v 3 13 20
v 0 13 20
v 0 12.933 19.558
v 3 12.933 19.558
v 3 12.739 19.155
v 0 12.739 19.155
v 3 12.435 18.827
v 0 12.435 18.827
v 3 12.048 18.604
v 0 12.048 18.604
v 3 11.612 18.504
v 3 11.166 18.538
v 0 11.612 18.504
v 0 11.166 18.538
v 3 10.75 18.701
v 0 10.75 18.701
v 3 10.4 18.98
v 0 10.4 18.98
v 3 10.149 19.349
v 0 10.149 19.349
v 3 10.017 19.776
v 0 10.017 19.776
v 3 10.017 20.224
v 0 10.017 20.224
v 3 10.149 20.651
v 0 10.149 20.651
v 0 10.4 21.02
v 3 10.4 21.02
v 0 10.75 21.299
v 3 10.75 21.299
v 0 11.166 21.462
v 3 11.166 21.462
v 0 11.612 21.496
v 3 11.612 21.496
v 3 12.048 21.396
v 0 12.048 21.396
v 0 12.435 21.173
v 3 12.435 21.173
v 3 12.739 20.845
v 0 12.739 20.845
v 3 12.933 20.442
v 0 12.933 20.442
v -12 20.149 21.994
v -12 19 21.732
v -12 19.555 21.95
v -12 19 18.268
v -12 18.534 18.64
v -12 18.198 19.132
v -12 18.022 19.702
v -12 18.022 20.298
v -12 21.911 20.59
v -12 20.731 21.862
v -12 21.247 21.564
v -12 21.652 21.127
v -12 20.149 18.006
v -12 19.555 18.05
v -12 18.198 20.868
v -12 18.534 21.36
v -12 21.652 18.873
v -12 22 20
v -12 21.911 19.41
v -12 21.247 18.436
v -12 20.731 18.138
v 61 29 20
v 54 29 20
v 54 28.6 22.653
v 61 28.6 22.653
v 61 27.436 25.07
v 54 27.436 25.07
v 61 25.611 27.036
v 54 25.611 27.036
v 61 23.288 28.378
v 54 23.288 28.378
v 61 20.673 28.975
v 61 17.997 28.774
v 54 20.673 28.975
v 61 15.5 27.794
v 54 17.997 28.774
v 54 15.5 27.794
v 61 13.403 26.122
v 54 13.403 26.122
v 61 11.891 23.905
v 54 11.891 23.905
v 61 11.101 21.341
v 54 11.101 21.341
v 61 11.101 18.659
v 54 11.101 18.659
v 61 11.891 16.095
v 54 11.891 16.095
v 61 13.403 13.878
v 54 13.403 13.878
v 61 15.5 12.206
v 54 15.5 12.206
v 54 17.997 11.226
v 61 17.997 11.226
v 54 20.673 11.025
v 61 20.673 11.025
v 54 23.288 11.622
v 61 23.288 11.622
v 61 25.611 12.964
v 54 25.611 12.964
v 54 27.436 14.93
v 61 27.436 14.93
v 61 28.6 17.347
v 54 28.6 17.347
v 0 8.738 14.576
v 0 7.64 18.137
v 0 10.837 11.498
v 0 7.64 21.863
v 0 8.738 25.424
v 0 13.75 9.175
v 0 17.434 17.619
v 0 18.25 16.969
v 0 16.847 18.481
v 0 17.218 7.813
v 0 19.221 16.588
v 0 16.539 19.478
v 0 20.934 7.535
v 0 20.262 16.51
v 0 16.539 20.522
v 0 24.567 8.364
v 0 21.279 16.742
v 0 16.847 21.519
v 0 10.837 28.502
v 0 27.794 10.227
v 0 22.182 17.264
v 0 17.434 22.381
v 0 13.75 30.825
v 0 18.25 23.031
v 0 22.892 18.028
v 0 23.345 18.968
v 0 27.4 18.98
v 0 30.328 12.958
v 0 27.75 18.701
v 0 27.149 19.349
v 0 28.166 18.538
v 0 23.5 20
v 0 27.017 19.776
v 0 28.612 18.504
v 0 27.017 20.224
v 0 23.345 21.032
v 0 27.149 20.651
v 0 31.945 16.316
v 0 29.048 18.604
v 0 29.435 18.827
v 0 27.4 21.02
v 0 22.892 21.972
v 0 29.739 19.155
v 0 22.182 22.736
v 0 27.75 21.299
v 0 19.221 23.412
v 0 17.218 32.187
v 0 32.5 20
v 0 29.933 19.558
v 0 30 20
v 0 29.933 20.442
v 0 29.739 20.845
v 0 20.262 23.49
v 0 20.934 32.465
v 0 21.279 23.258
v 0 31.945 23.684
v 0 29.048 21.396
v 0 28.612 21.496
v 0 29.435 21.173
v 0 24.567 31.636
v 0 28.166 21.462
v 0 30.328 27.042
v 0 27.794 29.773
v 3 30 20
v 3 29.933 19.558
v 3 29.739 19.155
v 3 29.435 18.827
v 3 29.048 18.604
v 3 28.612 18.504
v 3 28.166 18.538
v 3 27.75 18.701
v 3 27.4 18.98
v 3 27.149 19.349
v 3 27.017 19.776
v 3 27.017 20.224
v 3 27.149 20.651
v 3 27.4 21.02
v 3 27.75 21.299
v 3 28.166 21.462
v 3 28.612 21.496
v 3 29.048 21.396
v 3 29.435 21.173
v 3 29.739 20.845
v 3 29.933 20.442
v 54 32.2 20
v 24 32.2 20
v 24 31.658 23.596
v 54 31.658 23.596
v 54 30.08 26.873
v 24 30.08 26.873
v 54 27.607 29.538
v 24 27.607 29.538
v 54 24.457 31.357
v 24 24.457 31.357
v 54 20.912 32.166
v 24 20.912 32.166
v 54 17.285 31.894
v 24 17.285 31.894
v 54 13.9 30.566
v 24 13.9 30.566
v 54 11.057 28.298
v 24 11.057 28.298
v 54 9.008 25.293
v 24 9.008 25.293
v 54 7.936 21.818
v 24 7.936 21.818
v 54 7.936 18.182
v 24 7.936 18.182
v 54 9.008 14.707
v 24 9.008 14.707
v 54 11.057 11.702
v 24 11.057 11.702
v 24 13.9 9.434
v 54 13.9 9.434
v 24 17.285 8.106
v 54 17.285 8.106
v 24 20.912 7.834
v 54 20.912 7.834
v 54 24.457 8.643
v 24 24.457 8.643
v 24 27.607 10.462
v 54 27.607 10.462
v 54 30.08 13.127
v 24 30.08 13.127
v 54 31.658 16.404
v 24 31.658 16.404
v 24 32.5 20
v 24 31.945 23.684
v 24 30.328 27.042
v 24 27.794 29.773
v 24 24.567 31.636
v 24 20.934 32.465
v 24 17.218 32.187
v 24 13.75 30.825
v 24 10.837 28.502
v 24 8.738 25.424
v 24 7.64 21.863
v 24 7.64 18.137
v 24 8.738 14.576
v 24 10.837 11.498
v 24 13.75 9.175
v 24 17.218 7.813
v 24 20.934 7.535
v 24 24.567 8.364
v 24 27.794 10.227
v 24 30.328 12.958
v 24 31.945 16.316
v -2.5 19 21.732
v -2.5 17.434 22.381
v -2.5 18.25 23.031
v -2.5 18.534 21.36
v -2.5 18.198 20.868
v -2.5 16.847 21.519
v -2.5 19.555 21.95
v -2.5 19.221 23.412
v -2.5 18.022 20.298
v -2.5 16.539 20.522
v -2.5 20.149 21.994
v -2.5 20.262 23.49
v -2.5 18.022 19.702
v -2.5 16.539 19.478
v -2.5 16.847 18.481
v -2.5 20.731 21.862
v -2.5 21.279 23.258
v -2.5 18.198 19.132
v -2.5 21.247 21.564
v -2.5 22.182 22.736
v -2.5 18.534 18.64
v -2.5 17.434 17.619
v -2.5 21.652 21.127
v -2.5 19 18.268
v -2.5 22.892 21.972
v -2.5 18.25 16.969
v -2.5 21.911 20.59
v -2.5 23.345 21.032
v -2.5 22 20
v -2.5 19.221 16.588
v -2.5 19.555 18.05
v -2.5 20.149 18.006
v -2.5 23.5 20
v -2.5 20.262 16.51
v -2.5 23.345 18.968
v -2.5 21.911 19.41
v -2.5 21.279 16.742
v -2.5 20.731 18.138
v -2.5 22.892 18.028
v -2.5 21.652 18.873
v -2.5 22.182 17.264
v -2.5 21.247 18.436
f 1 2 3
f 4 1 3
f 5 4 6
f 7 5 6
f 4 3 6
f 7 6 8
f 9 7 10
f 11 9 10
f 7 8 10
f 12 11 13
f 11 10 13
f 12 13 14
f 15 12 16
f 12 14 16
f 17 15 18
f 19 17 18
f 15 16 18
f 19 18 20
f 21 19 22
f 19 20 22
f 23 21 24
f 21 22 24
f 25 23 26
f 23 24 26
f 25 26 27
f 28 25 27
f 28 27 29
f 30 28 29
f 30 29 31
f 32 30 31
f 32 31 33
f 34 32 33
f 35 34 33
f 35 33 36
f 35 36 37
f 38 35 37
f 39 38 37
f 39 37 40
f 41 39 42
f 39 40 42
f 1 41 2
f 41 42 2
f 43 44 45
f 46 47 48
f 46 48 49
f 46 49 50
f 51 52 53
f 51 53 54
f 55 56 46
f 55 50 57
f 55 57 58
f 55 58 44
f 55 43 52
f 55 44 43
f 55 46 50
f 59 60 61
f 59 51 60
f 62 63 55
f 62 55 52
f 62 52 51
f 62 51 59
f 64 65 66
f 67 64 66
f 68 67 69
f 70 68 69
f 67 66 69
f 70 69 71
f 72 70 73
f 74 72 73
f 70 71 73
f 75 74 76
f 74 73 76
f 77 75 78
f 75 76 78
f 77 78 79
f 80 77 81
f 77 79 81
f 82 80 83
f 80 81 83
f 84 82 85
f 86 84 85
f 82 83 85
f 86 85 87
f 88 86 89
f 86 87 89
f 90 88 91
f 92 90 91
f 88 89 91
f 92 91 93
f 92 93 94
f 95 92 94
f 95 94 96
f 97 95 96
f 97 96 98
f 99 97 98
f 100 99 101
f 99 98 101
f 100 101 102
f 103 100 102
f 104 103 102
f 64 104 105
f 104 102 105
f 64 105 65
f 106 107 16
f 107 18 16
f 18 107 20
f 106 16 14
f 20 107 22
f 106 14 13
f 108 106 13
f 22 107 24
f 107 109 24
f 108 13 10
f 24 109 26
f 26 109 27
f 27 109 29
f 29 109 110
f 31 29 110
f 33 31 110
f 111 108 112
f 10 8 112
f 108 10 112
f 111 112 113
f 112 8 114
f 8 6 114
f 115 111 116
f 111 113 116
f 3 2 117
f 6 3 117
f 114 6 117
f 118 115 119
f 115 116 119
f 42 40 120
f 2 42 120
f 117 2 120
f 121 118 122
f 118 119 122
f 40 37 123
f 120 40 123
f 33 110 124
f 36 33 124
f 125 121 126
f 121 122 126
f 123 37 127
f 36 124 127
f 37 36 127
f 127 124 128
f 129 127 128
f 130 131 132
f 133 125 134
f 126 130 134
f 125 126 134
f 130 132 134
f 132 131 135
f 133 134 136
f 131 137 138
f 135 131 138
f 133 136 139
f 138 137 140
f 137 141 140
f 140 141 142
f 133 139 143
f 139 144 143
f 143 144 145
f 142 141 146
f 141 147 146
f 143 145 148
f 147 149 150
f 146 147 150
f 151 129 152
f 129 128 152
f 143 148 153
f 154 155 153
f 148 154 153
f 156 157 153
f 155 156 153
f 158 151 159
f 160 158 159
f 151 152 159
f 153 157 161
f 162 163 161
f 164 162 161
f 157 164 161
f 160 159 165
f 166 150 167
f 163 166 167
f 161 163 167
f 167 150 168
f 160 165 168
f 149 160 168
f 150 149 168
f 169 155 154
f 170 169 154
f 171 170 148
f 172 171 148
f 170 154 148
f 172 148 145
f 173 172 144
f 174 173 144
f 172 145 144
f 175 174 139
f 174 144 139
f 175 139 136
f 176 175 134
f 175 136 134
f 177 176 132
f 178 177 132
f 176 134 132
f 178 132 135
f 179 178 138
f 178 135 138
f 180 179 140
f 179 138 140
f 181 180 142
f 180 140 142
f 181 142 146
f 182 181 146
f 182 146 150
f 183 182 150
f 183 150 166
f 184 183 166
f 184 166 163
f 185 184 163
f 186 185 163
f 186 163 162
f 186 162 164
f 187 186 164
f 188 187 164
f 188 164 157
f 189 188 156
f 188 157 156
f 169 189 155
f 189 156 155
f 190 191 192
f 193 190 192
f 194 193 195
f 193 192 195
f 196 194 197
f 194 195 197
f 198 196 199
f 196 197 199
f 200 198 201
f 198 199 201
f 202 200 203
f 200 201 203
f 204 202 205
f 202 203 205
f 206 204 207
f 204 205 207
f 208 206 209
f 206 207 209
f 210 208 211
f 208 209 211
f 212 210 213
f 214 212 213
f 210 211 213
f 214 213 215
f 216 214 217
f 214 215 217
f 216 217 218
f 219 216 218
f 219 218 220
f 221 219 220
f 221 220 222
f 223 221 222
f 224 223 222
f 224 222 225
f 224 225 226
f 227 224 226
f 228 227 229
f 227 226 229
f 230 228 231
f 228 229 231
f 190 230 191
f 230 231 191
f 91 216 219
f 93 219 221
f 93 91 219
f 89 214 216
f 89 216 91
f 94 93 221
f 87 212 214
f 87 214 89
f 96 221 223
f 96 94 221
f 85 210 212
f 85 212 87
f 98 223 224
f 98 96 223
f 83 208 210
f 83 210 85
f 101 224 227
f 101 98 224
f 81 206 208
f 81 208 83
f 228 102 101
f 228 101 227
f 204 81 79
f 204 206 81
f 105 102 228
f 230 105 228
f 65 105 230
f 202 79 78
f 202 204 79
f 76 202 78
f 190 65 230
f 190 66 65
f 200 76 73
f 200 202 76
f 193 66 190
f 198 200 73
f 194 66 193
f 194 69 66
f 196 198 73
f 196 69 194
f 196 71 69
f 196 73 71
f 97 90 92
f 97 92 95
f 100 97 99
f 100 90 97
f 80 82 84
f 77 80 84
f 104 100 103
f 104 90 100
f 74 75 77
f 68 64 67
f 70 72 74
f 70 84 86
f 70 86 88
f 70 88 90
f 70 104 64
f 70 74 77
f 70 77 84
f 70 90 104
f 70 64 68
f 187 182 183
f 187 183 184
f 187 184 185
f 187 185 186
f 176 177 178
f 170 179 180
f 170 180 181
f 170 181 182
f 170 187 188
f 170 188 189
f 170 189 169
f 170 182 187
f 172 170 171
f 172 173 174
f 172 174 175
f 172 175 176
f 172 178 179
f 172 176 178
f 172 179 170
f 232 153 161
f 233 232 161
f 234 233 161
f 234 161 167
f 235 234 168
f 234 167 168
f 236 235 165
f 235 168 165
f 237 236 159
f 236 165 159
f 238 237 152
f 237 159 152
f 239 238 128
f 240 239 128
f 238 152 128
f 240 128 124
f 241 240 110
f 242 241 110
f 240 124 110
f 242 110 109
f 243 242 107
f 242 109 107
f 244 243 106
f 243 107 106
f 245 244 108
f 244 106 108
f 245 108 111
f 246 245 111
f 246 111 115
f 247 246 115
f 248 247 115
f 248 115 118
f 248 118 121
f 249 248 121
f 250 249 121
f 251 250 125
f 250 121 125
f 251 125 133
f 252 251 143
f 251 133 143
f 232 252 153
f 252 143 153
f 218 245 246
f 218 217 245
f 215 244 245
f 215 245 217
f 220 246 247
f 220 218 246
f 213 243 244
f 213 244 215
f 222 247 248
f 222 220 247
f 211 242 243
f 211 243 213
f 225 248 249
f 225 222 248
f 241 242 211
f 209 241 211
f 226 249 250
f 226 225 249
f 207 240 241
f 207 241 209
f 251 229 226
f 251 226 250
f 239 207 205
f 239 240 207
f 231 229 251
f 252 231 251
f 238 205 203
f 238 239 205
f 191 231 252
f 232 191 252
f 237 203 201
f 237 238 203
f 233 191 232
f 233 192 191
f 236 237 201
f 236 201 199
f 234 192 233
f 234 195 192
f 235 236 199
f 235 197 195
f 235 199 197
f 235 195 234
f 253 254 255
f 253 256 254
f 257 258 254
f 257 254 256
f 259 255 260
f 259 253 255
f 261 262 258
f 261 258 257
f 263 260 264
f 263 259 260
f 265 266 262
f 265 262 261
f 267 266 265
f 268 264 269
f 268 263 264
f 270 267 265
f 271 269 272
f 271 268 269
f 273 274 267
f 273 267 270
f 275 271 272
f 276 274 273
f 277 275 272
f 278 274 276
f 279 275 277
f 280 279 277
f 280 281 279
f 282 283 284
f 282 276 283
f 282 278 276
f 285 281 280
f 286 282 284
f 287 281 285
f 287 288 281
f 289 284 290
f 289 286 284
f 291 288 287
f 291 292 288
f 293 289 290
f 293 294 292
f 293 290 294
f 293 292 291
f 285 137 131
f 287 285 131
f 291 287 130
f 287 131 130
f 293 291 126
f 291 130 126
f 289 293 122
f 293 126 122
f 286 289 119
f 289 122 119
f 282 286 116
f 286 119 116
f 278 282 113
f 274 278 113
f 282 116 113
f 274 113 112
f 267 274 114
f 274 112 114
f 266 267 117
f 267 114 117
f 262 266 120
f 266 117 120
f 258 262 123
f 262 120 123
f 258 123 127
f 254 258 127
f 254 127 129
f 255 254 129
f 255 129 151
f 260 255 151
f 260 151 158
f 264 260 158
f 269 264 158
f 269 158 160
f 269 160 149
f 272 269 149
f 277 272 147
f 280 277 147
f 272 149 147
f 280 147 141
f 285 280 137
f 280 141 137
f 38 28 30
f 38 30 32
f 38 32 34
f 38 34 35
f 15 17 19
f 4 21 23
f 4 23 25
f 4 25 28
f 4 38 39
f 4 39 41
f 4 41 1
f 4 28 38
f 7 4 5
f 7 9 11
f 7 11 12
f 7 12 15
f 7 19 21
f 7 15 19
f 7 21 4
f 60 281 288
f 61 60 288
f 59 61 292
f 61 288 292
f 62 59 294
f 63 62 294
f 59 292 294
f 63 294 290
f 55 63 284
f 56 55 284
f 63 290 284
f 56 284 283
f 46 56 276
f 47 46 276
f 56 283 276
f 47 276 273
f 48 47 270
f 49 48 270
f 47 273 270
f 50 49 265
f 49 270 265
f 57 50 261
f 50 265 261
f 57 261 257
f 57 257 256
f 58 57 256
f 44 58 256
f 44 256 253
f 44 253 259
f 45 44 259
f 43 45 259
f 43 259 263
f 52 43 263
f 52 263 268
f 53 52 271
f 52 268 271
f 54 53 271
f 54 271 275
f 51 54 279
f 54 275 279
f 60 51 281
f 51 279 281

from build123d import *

# Parameters (mm, degrees)
SKETCH_R        = 12.5
PAD_DEPTH       = 24
SKETCH001_R     = 12.2
PAD001_DEPTH    = 30
SKETCH002_R     = 3.5
PAD002_DEPTH    = 2.5
SKETCH003_R     = 2
PAD003_DEPTH    = 9.5
SKETCH004_R     = 9
PAD004_DEPTH    = 7
SKETCH009_R     = 1.5
POCKET002_DEPTH = 3


with BuildPart() as part:
    # Sketch → Pad (new body)
    with BuildSketch(Plane.YZ):
        with Locations((20, 20)):
            Circle(SKETCH_R)
    extrude(amount=PAD_DEPTH)

    # Sketch001 (on Face3 of Pad) → Pad001 (join)
    with BuildSketch(Plane.YZ.offset(24)):
        with Locations((20, 20)):
            Circle(SKETCH001_R)
    extrude(amount=PAD001_DEPTH)

    # Sketch002 (on Face2 of Pad001) → Pad002 (join)
    with BuildSketch(Plane(origin=(0, 0, 0), x_dir=(0, 1, 0), z_dir=(-1, 0, 0))):
        with Locations((20, -20)):
            Circle(SKETCH002_R)
    extrude(amount=PAD002_DEPTH)

    # Sketch003 (on Face6 of Pad002) → Pad003 (join)
    with BuildSketch(Plane(origin=(-2.5, 0, 0), x_dir=(0, 1, 0), z_dir=(-1, 0, 0))):
        with Locations((20, -20)):
            Circle(SKETCH003_R)
    extrude(amount=PAD003_DEPTH)

    # Sketch004 (on Face7 of Pad003) → Pad004 (join)
    with BuildSketch(Plane.YZ.offset(54)):
        with Locations((20, 20)):
            Circle(SKETCH004_R)
    extrude(amount=PAD004_DEPTH)

    # Sketch009 (on Face2 of Pad004) → Pocket002 (cut)
    with BuildSketch(Plane(origin=(0, 0, 0), x_dir=(0, 1, 0), z_dir=(-1, 0, 0))):
        with Locations((28.5, -20)):
            Circle(SKETCH009_R)
        with Locations((11.5, -20)):
            Circle(SKETCH009_R)
    extrude(amount=-POCKET002_DEPTH, mode=Mode.SUBTRACT)


solid = part.part
